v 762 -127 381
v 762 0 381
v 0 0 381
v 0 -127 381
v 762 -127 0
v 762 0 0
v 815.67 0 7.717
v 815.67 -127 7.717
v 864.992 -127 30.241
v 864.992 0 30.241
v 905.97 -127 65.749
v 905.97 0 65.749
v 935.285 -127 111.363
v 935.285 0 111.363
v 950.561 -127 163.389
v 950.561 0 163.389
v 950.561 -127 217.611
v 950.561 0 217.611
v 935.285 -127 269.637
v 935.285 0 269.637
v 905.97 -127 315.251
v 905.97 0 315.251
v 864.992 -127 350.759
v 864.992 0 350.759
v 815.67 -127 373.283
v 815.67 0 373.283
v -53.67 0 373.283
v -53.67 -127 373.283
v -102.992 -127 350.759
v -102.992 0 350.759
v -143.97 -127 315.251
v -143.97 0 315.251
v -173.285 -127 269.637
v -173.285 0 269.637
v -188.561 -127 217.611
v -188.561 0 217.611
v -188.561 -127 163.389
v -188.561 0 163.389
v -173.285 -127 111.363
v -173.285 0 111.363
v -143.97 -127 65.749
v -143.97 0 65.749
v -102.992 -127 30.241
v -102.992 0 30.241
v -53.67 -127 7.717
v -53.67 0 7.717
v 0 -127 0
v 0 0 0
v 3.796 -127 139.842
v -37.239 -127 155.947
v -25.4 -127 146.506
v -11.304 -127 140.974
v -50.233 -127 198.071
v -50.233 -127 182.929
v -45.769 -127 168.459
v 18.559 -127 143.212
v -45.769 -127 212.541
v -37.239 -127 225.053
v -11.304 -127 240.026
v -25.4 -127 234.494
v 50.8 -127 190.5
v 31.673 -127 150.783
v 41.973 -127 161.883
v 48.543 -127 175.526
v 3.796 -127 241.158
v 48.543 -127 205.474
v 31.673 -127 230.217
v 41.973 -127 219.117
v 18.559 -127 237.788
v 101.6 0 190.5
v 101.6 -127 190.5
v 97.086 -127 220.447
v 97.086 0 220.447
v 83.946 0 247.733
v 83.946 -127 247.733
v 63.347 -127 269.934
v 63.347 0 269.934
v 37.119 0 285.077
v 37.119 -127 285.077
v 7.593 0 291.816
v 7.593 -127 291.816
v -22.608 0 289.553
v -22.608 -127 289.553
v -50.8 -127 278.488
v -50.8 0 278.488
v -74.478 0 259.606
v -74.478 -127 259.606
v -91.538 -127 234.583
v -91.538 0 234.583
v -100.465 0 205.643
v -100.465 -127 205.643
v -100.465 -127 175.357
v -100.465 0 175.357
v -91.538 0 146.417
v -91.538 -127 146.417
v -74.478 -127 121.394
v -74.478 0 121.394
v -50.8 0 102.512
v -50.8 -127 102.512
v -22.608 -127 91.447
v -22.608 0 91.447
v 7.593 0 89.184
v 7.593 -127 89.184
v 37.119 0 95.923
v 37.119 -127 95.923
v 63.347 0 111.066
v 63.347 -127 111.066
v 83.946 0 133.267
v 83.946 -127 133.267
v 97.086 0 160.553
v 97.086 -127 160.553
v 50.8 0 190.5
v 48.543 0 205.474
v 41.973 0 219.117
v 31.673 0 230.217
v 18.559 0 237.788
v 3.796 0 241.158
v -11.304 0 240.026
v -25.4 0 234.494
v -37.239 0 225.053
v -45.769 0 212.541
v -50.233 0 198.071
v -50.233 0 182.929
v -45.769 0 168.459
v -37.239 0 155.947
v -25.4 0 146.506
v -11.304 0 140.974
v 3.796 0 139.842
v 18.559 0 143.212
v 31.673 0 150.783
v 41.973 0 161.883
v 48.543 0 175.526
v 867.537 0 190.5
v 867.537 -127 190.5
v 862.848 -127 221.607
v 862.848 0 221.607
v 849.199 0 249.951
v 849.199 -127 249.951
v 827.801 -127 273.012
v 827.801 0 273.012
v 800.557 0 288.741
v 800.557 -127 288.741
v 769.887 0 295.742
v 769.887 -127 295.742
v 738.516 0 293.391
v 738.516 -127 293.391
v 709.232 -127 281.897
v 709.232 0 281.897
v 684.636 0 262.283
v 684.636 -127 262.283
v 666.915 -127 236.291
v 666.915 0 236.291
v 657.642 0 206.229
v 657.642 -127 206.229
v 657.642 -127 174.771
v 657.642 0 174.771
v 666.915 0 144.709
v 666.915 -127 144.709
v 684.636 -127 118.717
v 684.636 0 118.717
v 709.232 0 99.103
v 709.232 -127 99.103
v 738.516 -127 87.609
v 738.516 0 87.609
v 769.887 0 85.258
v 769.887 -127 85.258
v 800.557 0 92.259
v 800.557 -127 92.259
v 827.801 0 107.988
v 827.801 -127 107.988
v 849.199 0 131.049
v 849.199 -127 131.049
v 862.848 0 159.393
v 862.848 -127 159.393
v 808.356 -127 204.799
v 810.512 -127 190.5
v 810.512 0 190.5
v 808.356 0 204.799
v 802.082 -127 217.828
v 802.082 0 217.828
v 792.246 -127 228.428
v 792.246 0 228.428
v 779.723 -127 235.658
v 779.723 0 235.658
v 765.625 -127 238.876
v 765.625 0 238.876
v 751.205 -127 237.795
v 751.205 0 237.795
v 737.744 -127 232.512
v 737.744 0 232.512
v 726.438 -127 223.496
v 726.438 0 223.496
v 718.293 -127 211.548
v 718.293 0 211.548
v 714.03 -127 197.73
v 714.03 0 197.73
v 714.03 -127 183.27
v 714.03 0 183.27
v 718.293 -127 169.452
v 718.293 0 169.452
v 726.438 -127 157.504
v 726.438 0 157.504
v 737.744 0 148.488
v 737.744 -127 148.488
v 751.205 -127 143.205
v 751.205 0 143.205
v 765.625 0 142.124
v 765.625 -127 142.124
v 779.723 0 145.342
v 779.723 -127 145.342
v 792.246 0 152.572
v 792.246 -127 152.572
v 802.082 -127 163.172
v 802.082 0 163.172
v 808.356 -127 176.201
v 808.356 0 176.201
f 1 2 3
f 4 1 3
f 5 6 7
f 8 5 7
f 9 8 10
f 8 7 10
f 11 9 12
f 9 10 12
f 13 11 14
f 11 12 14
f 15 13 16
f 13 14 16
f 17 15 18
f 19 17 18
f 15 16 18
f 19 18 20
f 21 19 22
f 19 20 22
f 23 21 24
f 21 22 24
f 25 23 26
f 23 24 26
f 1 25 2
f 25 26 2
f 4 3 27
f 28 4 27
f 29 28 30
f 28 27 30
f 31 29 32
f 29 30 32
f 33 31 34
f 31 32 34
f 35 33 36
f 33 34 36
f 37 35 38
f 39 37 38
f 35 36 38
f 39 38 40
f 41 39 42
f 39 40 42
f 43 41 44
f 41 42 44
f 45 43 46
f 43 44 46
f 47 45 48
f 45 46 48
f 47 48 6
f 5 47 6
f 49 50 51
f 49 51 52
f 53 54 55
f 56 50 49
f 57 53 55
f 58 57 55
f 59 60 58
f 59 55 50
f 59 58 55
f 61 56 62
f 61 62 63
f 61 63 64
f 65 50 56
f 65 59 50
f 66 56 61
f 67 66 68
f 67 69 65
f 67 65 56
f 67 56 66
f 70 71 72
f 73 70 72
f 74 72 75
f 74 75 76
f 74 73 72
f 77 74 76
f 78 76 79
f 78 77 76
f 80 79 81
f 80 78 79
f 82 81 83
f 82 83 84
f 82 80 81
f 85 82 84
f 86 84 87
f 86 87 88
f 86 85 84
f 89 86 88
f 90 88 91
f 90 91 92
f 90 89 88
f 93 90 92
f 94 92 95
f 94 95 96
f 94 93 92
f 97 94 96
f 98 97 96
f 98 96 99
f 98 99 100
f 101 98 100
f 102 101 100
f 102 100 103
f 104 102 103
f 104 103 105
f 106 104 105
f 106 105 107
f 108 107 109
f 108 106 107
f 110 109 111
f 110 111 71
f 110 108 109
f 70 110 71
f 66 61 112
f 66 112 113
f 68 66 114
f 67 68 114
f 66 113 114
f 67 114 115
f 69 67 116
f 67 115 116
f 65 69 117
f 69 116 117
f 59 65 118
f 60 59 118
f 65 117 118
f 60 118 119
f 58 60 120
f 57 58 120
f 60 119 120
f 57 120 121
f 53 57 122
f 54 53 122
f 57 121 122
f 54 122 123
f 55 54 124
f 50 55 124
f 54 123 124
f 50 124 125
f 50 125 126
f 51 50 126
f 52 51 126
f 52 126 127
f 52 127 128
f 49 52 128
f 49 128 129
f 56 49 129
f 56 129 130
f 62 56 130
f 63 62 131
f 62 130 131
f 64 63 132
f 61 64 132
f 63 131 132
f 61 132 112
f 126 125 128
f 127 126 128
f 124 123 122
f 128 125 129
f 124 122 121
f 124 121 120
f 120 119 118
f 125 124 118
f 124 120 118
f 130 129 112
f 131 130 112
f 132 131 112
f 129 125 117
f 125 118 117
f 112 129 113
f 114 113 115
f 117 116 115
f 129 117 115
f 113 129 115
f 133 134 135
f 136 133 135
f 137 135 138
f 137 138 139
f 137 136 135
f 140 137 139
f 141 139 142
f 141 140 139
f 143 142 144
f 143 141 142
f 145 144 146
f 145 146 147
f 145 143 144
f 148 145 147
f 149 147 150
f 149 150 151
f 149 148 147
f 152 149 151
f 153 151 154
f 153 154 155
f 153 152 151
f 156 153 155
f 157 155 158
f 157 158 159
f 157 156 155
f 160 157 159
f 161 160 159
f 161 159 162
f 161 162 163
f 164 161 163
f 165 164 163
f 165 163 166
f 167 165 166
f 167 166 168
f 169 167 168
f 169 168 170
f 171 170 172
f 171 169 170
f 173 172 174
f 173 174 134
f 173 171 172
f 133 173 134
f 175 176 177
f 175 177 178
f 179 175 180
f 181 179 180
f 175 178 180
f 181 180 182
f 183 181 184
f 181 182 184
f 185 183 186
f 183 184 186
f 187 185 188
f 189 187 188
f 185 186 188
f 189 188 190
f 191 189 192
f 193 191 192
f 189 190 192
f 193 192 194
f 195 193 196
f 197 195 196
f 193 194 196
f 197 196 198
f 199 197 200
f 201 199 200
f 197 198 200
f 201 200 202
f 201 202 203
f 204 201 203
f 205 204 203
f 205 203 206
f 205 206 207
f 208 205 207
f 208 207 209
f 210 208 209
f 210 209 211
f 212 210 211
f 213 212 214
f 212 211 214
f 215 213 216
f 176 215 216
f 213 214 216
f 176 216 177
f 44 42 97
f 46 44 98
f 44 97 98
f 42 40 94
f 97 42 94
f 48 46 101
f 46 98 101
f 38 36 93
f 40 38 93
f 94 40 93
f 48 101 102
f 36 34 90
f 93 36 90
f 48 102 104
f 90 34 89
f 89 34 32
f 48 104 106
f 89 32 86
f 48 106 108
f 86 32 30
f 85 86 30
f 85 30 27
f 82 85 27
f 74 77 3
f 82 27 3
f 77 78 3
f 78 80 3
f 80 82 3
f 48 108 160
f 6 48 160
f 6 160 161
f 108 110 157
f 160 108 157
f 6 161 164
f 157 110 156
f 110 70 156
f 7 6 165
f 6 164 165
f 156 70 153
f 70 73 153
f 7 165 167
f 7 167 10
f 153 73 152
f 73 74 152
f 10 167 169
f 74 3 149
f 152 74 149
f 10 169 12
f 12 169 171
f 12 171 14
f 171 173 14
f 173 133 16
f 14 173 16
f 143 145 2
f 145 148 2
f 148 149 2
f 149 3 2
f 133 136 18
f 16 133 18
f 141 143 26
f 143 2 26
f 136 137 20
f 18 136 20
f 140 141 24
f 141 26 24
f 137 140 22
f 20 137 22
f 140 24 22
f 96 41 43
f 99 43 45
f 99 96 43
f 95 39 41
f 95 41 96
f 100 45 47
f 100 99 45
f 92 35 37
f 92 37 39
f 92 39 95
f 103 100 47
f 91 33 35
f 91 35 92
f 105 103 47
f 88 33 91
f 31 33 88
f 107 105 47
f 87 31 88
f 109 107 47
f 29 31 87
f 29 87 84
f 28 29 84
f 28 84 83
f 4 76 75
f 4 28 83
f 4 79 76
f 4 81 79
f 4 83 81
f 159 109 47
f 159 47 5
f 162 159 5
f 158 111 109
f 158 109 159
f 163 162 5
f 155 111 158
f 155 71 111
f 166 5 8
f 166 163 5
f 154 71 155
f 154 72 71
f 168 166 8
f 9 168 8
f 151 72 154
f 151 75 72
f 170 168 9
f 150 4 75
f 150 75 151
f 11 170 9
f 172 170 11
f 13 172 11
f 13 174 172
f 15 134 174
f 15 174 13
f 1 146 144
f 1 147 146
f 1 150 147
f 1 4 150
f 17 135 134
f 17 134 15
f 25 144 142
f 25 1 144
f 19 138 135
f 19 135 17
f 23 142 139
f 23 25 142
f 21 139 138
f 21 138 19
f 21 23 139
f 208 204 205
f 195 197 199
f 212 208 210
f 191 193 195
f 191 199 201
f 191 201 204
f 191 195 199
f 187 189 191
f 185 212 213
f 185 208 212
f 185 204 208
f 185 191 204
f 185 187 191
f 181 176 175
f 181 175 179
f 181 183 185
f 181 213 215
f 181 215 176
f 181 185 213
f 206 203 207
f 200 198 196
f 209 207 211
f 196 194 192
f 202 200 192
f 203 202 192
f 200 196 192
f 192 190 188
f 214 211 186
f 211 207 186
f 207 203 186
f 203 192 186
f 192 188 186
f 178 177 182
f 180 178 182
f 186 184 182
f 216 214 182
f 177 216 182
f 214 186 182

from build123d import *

# Parameters (mm, degrees)
F0_R     = 101.6
F0_R_2   = 105.536712
F0_R_3   = 50.8
F0_R_4   = 48.511603
F1_DEPTH = 127


with BuildPart() as f1:
    # F0 (on Front) → F1 (new body)
    with BuildSketch(Plane.XZ):
        with BuildLine():
            ThreePointArc((0, 381), (-190.5, 190.5), (0, 0))
            Line((0, 0), (762, 0))
            ThreePointArc((762, 0), (952.5, 190.5), (762, 381))
            Line((762, 381), (0, 381))
        make_face()
        with Locations((0, 190.5)):
            Circle(F0_R, mode=Mode.SUBTRACT)
        with Locations((762, 190.5)):
            Circle(F0_R_2, mode=Mode.SUBTRACT)
        with Locations((0, 190.5)):
            Circle(F0_R_3)
        with Locations((762, 190.5)):
            Circle(F0_R_4)
    extrude(amount=F1_DEPTH)


solid = f1.part
